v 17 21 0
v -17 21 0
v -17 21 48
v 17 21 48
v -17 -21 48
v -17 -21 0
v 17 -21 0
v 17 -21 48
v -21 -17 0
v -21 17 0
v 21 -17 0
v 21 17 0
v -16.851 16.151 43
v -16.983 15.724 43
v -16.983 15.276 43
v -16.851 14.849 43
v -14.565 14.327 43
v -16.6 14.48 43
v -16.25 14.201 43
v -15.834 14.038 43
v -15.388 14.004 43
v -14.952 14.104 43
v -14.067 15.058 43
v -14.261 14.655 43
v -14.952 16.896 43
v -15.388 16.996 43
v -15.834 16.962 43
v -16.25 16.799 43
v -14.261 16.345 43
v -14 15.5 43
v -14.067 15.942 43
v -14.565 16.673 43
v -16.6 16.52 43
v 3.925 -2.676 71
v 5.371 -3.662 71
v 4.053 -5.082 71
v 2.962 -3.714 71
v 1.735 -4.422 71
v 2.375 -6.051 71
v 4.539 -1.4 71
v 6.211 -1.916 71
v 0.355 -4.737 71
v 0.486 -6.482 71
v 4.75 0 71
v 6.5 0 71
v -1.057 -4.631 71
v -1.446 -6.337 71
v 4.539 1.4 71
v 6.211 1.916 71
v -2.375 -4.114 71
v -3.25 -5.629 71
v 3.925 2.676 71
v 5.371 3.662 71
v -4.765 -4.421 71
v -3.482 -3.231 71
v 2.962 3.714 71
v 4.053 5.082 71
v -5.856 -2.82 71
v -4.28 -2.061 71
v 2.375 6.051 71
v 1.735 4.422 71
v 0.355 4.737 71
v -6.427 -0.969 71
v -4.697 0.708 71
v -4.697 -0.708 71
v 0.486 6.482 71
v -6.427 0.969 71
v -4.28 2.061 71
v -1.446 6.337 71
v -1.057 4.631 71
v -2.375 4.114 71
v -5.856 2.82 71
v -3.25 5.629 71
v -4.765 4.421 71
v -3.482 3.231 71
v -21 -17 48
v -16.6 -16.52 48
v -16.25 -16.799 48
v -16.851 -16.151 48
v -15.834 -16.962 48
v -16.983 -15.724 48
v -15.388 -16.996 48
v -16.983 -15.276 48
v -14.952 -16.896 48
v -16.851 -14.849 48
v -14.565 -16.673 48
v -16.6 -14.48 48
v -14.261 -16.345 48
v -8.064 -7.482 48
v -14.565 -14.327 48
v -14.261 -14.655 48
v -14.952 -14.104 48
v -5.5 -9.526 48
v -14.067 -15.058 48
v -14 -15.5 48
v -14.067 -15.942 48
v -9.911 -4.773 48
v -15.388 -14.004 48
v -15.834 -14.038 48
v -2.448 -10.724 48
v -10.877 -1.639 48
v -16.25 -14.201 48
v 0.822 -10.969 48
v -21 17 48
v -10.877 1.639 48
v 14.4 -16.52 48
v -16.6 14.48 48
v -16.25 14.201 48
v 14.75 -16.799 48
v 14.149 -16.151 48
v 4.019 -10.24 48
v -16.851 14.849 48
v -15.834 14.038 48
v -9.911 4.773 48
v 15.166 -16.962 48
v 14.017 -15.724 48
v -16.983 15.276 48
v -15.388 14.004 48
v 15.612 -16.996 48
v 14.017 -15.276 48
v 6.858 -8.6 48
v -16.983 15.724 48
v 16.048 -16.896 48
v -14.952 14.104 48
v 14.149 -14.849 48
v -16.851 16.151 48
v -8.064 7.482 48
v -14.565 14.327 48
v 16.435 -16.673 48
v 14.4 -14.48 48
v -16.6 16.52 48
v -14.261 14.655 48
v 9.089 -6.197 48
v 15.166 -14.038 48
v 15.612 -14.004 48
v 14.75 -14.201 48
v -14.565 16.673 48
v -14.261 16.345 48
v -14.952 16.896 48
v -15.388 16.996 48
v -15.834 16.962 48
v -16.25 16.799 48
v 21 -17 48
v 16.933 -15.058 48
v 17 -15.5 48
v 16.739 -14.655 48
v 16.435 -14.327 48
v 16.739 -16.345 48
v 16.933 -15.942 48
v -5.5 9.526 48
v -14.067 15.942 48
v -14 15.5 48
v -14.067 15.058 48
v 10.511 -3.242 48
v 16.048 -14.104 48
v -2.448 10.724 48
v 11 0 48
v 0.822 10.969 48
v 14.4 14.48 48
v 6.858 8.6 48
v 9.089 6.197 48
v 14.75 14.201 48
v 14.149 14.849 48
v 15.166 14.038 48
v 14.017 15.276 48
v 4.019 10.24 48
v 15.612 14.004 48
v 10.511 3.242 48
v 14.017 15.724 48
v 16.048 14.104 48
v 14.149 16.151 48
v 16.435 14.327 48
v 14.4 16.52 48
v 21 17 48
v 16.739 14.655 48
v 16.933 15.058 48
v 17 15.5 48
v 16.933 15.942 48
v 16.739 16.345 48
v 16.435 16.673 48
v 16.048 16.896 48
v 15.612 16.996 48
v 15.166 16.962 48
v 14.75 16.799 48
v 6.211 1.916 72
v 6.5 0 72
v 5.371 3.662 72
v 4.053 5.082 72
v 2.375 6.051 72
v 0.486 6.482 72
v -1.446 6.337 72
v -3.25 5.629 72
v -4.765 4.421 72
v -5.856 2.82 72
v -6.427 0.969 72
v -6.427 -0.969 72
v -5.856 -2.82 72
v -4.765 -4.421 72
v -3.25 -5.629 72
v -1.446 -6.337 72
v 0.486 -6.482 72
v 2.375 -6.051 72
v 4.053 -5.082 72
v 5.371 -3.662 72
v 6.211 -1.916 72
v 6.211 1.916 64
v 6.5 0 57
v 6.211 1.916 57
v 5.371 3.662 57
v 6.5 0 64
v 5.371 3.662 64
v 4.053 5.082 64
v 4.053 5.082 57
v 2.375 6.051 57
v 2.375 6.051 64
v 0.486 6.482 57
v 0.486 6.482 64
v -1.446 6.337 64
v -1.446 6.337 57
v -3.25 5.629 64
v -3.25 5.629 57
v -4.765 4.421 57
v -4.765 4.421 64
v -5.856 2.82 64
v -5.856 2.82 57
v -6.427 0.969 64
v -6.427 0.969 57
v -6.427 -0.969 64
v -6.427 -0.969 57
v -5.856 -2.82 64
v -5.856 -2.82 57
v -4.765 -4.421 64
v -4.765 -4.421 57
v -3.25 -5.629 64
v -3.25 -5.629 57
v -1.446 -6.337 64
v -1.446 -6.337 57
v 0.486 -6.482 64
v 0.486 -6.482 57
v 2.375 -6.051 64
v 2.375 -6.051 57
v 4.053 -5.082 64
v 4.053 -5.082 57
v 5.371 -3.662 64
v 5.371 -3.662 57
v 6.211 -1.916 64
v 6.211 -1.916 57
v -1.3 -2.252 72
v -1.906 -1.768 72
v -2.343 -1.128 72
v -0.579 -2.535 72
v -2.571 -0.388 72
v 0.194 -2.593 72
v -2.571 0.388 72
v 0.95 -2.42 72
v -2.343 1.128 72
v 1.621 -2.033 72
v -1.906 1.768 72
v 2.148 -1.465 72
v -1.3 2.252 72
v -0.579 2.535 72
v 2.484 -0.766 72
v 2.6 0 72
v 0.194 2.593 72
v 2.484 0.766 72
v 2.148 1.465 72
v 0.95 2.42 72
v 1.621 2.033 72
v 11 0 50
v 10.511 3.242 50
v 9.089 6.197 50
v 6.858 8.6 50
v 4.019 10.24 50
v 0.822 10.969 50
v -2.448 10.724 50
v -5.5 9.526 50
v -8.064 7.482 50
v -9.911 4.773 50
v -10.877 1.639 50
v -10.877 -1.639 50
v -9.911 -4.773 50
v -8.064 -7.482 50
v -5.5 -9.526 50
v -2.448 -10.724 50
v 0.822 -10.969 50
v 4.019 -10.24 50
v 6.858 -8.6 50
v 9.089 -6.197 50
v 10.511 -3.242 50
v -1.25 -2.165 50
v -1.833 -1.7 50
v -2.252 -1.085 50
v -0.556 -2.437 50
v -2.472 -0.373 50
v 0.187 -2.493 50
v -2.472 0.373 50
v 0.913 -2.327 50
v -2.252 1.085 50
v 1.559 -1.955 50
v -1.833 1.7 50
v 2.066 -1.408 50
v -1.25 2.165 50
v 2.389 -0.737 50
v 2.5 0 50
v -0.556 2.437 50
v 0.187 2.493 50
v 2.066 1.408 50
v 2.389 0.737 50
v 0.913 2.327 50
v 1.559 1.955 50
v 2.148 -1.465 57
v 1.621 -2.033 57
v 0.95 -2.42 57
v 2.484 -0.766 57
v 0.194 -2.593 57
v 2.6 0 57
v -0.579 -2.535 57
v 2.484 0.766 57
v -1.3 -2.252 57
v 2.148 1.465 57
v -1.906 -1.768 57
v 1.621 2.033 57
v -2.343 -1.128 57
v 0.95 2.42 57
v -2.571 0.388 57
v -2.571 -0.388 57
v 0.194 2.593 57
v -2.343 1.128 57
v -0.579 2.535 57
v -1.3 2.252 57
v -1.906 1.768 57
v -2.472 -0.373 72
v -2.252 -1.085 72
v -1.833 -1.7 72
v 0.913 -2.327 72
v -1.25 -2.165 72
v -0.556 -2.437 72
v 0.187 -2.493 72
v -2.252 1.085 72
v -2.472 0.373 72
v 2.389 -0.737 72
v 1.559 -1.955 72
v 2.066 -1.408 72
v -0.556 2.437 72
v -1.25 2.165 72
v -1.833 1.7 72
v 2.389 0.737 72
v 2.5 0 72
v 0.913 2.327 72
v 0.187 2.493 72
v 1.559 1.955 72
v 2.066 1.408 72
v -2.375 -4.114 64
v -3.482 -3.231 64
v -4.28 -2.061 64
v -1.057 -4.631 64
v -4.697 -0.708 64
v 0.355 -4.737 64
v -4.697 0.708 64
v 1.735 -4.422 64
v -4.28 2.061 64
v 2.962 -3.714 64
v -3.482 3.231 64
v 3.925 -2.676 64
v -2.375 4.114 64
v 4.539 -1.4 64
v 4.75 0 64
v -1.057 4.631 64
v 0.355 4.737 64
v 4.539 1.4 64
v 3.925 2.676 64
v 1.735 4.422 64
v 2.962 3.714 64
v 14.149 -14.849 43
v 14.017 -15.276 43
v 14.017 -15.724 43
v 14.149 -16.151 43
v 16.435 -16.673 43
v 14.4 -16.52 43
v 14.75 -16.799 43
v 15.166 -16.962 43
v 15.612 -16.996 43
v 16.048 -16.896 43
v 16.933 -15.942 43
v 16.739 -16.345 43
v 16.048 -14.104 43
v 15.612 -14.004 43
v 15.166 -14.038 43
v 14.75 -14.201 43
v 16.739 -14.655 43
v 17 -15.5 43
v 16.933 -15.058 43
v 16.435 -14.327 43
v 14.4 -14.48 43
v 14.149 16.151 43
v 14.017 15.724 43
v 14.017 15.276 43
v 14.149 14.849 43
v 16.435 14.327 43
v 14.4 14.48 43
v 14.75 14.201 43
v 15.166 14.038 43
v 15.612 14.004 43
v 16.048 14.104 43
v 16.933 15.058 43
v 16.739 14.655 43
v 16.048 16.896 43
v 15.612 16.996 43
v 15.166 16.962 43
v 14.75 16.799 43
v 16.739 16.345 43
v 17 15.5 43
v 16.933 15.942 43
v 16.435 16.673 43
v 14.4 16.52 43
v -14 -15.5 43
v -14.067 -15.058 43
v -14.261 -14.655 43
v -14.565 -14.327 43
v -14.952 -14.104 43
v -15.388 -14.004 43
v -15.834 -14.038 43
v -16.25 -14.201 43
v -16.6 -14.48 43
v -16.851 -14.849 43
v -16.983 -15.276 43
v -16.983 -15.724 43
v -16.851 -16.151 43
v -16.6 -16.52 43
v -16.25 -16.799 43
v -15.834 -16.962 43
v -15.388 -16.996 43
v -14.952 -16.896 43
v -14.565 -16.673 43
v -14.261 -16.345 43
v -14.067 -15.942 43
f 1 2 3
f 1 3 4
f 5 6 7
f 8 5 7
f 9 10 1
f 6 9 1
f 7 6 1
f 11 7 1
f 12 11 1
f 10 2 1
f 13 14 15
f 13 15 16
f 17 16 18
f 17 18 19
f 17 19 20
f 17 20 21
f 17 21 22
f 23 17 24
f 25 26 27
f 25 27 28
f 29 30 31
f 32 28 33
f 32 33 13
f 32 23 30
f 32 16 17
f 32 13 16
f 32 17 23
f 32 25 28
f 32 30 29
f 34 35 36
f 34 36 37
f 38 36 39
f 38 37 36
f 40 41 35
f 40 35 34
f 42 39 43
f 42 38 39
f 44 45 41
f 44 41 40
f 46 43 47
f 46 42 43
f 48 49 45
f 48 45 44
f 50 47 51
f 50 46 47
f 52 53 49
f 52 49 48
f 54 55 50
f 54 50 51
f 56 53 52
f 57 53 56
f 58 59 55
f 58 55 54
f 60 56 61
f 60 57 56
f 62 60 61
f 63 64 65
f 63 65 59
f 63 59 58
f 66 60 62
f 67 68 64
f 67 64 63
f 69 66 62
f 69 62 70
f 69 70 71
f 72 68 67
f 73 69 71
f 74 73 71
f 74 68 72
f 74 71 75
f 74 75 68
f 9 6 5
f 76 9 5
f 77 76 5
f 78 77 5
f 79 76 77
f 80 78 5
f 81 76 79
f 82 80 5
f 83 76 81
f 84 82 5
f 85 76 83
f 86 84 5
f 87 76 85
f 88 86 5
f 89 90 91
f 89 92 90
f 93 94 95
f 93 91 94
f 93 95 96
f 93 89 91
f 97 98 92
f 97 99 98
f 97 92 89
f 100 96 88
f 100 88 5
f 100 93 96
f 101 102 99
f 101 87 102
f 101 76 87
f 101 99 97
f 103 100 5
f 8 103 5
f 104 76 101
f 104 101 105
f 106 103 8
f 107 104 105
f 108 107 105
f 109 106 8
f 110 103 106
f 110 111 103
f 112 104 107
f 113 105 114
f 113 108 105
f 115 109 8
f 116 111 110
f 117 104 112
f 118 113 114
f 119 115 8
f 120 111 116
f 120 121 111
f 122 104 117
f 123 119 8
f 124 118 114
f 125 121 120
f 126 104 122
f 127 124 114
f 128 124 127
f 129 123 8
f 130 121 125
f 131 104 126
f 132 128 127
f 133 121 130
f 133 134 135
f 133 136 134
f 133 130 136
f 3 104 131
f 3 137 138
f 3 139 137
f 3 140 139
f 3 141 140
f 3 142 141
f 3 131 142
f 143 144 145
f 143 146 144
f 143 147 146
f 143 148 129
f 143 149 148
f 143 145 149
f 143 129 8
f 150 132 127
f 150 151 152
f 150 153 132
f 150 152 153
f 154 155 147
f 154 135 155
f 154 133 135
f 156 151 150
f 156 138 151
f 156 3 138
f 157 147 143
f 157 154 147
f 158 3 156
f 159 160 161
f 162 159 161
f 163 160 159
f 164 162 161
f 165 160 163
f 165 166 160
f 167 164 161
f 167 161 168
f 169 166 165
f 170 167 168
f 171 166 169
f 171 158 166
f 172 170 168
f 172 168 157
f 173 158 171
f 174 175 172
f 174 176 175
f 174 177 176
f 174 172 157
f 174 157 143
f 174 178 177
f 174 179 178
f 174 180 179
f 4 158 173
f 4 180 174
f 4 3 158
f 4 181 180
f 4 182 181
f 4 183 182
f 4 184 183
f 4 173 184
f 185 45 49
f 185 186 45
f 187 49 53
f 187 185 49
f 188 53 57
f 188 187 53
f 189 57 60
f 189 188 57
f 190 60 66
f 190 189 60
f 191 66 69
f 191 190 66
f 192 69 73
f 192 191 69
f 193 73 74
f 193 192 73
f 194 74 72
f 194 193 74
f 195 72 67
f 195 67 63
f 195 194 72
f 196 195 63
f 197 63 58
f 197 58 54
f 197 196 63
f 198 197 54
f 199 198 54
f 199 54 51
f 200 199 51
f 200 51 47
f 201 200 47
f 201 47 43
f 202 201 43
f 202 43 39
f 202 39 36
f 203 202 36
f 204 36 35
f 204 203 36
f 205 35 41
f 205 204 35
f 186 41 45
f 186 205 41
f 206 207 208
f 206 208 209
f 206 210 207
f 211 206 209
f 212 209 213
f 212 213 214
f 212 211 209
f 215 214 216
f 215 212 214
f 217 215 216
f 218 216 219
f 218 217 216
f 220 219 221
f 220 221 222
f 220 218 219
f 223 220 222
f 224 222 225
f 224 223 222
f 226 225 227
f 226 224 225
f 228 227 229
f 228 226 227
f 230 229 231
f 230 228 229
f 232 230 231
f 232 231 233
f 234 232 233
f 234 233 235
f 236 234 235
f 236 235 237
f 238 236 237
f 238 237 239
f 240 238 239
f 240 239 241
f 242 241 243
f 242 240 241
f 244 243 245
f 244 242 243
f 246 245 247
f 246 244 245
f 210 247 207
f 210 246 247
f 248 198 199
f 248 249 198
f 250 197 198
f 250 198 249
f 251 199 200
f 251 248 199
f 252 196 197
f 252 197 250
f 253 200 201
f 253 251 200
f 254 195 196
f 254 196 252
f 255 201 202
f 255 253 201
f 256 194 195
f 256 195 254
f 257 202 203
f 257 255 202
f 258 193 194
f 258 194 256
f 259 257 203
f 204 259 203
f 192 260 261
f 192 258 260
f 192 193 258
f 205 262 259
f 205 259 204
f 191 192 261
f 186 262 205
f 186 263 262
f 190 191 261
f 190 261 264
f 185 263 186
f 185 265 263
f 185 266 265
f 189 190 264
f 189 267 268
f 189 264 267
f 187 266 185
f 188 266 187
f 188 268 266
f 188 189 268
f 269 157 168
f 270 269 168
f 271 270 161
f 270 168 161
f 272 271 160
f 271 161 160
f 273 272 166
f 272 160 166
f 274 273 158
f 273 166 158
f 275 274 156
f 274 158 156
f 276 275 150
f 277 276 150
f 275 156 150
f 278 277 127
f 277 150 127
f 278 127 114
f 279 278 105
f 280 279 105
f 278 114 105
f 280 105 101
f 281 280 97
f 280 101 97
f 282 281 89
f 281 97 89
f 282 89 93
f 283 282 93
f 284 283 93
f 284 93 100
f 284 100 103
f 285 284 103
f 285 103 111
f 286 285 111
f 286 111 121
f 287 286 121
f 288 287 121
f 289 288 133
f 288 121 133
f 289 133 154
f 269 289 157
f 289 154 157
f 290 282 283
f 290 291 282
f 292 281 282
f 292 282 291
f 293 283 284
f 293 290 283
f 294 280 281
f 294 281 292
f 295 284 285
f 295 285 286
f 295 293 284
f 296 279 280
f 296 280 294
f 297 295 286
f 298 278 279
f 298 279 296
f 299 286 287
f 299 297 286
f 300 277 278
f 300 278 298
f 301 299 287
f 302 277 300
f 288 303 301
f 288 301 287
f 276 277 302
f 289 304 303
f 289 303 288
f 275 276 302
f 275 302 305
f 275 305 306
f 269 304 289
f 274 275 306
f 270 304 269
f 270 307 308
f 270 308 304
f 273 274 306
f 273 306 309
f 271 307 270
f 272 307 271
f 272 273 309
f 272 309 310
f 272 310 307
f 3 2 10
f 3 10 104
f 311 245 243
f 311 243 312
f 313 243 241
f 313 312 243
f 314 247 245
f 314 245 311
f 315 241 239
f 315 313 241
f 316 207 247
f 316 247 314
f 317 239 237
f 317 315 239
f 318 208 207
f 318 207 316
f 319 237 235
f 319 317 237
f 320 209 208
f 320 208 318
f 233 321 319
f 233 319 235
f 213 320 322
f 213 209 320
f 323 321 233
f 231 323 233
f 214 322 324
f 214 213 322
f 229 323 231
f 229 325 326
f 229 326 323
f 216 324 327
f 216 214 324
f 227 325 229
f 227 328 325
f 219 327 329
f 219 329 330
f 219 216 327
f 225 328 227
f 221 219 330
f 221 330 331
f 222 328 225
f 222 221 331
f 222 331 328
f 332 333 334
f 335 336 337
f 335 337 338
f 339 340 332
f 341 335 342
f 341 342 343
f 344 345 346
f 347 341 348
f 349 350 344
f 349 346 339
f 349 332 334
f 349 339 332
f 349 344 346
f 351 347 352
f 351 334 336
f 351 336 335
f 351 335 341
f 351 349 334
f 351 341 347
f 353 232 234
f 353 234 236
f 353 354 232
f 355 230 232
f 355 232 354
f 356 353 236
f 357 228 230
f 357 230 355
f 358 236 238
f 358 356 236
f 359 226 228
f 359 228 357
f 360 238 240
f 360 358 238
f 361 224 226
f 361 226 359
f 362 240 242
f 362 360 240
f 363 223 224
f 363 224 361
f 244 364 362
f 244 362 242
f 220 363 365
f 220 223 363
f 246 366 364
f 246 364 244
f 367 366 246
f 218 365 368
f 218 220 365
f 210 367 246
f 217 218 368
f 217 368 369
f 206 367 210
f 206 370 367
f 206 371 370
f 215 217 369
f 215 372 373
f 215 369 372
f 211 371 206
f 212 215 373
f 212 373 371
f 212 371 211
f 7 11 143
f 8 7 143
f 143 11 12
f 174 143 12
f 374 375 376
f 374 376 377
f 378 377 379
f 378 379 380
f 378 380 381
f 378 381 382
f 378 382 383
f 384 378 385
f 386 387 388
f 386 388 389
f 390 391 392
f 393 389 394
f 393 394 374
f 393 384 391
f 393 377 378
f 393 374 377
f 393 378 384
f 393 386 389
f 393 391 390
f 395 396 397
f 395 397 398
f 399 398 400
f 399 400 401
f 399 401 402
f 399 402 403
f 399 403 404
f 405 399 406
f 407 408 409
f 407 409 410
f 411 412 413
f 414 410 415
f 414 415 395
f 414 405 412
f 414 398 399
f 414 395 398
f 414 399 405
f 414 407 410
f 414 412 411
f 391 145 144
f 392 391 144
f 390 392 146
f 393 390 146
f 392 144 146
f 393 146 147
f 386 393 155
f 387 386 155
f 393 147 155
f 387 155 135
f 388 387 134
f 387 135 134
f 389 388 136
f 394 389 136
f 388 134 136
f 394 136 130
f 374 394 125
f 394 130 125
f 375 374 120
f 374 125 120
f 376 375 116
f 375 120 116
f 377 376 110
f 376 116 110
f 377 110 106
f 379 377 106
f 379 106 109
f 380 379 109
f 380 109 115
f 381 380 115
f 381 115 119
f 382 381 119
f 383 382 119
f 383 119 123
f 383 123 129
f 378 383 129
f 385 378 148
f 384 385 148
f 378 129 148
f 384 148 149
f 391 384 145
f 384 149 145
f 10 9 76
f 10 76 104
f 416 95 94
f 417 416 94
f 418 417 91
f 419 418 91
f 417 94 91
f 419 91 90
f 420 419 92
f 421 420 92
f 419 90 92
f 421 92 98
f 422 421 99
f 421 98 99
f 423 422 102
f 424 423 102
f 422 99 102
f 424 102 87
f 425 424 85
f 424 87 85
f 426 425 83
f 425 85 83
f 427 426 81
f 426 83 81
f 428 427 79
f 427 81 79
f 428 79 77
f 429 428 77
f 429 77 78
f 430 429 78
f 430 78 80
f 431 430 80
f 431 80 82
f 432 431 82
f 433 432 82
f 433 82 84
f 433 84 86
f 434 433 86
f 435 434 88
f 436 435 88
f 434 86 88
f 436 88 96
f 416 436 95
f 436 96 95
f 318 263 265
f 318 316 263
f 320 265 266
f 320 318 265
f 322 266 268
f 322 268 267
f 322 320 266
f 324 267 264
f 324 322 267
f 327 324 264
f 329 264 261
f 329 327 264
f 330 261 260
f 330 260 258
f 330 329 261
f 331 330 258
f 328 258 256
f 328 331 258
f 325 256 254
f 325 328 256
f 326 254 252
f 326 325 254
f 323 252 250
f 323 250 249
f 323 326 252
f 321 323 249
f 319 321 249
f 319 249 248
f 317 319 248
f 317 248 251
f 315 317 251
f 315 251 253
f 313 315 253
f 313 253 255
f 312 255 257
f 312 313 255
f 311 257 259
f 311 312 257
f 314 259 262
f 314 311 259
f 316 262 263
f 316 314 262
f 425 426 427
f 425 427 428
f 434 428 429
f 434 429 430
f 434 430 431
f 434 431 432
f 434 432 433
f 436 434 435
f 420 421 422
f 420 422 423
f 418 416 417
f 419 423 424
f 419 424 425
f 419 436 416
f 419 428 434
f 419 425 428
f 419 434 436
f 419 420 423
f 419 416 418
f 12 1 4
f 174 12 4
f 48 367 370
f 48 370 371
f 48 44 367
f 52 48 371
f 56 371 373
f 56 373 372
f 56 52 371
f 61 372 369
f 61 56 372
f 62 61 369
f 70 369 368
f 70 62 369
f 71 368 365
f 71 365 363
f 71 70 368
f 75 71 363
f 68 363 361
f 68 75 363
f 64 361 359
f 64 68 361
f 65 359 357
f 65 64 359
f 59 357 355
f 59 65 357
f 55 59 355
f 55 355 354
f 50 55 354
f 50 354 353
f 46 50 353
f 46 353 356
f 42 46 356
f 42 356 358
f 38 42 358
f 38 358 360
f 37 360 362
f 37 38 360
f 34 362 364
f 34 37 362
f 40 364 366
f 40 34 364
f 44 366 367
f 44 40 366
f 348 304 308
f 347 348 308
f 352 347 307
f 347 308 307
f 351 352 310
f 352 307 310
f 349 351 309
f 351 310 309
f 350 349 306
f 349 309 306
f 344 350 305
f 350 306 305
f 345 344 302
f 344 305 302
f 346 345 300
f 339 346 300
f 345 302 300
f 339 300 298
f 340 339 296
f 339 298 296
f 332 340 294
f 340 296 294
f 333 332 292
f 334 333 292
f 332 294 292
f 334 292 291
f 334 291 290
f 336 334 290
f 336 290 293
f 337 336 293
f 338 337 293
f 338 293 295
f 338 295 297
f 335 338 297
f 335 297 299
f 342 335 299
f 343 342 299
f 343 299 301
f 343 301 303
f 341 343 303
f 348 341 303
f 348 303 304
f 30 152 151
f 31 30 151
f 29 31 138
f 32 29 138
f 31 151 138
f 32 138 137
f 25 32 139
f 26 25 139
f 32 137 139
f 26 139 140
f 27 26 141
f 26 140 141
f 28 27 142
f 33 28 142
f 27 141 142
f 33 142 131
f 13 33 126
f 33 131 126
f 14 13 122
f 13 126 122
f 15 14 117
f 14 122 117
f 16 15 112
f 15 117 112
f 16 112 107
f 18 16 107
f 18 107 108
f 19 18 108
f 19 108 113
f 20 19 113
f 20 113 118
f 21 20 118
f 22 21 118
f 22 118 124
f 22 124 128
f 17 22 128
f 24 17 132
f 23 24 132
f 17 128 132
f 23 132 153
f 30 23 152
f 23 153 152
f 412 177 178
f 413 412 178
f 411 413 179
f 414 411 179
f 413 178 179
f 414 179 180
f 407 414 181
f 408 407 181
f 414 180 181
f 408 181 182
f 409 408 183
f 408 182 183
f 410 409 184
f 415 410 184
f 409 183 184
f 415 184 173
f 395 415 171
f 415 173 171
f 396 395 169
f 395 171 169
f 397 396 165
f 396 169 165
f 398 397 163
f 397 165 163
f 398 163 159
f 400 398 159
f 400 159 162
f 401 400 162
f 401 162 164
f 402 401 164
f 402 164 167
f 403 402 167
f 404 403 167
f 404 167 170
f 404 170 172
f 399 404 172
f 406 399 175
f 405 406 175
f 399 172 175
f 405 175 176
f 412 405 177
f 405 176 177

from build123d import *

# Parameters (mm, degrees)
F0_W     = 42
F0_H     = 42
F1_DEPTH = 48
F2_SIZE  = 4
F3_R     = 2.5
F4_DEPTH = 24
F3_R_2   = 11
F5_DEPTH = 2
F3_R_3   = 1.5
F6_DEPTH = 5


with BuildPart() as f1:
    # F0 (on Top) → F1 (new body)
    with BuildSketch(Plane.XY):
        Rectangle(F0_W, F0_H)
    extrude(amount=F1_DEPTH)

    # F2
    f2_edges = [f1.edges().sort_by_distance(p)[0] for p in [
        (-21, -21, 24),
        (21, -21, 24),
        (21, 21, 24),
        (-21, 21, 24),
    ]]
    chamfer(f2_edges, length=F2_SIZE)

    # F3 (on face) → F4 (join)
    with BuildSketch(Plane.XY.offset(48)):
        Circle(F3_R)
    extrude(amount=F4_DEPTH)

    # F3 (on face) → F5 (join)
    with BuildSketch(Plane.XY.offset(48)):
        Circle(F3_R_2)
        Circle(F3_R, mode=Mode.SUBTRACT)
        Circle(F3_R)
    extrude(amount=F5_DEPTH)

    # F3 (on face) → F6 (cut)
    with BuildSketch(Plane.XY.offset(48)):
        with Locations((15.5, -15.5)):
            Circle(F3_R_3)
        with Locations((15.5, 15.5)):
            Circle(F3_R_3)
        with Locations((-15.5, 15.5)):
            Circle(F3_R_3)
        with Locations((-15.5, -15.5)):
            Circle(F3_R_3)
    extrude(amount=-F6_DEPTH, mode=Mode.SUBTRACT)


with BuildPart() as f8:
    # F7 (on Front) → F8 (revolve)
    with BuildSketch(Plane.XZ):
        Polygon((2.6, 57), (6.5, 57), (6.5, 64), (4.75, 64), (4.75, 71), (6.5, 71), (6.5, 72), (2.6, 72), align=None)
    revolve(axis=Axis((0, 0, 77), (0, 0, 1)))


solid = Compound([f1.part, f8.part])
